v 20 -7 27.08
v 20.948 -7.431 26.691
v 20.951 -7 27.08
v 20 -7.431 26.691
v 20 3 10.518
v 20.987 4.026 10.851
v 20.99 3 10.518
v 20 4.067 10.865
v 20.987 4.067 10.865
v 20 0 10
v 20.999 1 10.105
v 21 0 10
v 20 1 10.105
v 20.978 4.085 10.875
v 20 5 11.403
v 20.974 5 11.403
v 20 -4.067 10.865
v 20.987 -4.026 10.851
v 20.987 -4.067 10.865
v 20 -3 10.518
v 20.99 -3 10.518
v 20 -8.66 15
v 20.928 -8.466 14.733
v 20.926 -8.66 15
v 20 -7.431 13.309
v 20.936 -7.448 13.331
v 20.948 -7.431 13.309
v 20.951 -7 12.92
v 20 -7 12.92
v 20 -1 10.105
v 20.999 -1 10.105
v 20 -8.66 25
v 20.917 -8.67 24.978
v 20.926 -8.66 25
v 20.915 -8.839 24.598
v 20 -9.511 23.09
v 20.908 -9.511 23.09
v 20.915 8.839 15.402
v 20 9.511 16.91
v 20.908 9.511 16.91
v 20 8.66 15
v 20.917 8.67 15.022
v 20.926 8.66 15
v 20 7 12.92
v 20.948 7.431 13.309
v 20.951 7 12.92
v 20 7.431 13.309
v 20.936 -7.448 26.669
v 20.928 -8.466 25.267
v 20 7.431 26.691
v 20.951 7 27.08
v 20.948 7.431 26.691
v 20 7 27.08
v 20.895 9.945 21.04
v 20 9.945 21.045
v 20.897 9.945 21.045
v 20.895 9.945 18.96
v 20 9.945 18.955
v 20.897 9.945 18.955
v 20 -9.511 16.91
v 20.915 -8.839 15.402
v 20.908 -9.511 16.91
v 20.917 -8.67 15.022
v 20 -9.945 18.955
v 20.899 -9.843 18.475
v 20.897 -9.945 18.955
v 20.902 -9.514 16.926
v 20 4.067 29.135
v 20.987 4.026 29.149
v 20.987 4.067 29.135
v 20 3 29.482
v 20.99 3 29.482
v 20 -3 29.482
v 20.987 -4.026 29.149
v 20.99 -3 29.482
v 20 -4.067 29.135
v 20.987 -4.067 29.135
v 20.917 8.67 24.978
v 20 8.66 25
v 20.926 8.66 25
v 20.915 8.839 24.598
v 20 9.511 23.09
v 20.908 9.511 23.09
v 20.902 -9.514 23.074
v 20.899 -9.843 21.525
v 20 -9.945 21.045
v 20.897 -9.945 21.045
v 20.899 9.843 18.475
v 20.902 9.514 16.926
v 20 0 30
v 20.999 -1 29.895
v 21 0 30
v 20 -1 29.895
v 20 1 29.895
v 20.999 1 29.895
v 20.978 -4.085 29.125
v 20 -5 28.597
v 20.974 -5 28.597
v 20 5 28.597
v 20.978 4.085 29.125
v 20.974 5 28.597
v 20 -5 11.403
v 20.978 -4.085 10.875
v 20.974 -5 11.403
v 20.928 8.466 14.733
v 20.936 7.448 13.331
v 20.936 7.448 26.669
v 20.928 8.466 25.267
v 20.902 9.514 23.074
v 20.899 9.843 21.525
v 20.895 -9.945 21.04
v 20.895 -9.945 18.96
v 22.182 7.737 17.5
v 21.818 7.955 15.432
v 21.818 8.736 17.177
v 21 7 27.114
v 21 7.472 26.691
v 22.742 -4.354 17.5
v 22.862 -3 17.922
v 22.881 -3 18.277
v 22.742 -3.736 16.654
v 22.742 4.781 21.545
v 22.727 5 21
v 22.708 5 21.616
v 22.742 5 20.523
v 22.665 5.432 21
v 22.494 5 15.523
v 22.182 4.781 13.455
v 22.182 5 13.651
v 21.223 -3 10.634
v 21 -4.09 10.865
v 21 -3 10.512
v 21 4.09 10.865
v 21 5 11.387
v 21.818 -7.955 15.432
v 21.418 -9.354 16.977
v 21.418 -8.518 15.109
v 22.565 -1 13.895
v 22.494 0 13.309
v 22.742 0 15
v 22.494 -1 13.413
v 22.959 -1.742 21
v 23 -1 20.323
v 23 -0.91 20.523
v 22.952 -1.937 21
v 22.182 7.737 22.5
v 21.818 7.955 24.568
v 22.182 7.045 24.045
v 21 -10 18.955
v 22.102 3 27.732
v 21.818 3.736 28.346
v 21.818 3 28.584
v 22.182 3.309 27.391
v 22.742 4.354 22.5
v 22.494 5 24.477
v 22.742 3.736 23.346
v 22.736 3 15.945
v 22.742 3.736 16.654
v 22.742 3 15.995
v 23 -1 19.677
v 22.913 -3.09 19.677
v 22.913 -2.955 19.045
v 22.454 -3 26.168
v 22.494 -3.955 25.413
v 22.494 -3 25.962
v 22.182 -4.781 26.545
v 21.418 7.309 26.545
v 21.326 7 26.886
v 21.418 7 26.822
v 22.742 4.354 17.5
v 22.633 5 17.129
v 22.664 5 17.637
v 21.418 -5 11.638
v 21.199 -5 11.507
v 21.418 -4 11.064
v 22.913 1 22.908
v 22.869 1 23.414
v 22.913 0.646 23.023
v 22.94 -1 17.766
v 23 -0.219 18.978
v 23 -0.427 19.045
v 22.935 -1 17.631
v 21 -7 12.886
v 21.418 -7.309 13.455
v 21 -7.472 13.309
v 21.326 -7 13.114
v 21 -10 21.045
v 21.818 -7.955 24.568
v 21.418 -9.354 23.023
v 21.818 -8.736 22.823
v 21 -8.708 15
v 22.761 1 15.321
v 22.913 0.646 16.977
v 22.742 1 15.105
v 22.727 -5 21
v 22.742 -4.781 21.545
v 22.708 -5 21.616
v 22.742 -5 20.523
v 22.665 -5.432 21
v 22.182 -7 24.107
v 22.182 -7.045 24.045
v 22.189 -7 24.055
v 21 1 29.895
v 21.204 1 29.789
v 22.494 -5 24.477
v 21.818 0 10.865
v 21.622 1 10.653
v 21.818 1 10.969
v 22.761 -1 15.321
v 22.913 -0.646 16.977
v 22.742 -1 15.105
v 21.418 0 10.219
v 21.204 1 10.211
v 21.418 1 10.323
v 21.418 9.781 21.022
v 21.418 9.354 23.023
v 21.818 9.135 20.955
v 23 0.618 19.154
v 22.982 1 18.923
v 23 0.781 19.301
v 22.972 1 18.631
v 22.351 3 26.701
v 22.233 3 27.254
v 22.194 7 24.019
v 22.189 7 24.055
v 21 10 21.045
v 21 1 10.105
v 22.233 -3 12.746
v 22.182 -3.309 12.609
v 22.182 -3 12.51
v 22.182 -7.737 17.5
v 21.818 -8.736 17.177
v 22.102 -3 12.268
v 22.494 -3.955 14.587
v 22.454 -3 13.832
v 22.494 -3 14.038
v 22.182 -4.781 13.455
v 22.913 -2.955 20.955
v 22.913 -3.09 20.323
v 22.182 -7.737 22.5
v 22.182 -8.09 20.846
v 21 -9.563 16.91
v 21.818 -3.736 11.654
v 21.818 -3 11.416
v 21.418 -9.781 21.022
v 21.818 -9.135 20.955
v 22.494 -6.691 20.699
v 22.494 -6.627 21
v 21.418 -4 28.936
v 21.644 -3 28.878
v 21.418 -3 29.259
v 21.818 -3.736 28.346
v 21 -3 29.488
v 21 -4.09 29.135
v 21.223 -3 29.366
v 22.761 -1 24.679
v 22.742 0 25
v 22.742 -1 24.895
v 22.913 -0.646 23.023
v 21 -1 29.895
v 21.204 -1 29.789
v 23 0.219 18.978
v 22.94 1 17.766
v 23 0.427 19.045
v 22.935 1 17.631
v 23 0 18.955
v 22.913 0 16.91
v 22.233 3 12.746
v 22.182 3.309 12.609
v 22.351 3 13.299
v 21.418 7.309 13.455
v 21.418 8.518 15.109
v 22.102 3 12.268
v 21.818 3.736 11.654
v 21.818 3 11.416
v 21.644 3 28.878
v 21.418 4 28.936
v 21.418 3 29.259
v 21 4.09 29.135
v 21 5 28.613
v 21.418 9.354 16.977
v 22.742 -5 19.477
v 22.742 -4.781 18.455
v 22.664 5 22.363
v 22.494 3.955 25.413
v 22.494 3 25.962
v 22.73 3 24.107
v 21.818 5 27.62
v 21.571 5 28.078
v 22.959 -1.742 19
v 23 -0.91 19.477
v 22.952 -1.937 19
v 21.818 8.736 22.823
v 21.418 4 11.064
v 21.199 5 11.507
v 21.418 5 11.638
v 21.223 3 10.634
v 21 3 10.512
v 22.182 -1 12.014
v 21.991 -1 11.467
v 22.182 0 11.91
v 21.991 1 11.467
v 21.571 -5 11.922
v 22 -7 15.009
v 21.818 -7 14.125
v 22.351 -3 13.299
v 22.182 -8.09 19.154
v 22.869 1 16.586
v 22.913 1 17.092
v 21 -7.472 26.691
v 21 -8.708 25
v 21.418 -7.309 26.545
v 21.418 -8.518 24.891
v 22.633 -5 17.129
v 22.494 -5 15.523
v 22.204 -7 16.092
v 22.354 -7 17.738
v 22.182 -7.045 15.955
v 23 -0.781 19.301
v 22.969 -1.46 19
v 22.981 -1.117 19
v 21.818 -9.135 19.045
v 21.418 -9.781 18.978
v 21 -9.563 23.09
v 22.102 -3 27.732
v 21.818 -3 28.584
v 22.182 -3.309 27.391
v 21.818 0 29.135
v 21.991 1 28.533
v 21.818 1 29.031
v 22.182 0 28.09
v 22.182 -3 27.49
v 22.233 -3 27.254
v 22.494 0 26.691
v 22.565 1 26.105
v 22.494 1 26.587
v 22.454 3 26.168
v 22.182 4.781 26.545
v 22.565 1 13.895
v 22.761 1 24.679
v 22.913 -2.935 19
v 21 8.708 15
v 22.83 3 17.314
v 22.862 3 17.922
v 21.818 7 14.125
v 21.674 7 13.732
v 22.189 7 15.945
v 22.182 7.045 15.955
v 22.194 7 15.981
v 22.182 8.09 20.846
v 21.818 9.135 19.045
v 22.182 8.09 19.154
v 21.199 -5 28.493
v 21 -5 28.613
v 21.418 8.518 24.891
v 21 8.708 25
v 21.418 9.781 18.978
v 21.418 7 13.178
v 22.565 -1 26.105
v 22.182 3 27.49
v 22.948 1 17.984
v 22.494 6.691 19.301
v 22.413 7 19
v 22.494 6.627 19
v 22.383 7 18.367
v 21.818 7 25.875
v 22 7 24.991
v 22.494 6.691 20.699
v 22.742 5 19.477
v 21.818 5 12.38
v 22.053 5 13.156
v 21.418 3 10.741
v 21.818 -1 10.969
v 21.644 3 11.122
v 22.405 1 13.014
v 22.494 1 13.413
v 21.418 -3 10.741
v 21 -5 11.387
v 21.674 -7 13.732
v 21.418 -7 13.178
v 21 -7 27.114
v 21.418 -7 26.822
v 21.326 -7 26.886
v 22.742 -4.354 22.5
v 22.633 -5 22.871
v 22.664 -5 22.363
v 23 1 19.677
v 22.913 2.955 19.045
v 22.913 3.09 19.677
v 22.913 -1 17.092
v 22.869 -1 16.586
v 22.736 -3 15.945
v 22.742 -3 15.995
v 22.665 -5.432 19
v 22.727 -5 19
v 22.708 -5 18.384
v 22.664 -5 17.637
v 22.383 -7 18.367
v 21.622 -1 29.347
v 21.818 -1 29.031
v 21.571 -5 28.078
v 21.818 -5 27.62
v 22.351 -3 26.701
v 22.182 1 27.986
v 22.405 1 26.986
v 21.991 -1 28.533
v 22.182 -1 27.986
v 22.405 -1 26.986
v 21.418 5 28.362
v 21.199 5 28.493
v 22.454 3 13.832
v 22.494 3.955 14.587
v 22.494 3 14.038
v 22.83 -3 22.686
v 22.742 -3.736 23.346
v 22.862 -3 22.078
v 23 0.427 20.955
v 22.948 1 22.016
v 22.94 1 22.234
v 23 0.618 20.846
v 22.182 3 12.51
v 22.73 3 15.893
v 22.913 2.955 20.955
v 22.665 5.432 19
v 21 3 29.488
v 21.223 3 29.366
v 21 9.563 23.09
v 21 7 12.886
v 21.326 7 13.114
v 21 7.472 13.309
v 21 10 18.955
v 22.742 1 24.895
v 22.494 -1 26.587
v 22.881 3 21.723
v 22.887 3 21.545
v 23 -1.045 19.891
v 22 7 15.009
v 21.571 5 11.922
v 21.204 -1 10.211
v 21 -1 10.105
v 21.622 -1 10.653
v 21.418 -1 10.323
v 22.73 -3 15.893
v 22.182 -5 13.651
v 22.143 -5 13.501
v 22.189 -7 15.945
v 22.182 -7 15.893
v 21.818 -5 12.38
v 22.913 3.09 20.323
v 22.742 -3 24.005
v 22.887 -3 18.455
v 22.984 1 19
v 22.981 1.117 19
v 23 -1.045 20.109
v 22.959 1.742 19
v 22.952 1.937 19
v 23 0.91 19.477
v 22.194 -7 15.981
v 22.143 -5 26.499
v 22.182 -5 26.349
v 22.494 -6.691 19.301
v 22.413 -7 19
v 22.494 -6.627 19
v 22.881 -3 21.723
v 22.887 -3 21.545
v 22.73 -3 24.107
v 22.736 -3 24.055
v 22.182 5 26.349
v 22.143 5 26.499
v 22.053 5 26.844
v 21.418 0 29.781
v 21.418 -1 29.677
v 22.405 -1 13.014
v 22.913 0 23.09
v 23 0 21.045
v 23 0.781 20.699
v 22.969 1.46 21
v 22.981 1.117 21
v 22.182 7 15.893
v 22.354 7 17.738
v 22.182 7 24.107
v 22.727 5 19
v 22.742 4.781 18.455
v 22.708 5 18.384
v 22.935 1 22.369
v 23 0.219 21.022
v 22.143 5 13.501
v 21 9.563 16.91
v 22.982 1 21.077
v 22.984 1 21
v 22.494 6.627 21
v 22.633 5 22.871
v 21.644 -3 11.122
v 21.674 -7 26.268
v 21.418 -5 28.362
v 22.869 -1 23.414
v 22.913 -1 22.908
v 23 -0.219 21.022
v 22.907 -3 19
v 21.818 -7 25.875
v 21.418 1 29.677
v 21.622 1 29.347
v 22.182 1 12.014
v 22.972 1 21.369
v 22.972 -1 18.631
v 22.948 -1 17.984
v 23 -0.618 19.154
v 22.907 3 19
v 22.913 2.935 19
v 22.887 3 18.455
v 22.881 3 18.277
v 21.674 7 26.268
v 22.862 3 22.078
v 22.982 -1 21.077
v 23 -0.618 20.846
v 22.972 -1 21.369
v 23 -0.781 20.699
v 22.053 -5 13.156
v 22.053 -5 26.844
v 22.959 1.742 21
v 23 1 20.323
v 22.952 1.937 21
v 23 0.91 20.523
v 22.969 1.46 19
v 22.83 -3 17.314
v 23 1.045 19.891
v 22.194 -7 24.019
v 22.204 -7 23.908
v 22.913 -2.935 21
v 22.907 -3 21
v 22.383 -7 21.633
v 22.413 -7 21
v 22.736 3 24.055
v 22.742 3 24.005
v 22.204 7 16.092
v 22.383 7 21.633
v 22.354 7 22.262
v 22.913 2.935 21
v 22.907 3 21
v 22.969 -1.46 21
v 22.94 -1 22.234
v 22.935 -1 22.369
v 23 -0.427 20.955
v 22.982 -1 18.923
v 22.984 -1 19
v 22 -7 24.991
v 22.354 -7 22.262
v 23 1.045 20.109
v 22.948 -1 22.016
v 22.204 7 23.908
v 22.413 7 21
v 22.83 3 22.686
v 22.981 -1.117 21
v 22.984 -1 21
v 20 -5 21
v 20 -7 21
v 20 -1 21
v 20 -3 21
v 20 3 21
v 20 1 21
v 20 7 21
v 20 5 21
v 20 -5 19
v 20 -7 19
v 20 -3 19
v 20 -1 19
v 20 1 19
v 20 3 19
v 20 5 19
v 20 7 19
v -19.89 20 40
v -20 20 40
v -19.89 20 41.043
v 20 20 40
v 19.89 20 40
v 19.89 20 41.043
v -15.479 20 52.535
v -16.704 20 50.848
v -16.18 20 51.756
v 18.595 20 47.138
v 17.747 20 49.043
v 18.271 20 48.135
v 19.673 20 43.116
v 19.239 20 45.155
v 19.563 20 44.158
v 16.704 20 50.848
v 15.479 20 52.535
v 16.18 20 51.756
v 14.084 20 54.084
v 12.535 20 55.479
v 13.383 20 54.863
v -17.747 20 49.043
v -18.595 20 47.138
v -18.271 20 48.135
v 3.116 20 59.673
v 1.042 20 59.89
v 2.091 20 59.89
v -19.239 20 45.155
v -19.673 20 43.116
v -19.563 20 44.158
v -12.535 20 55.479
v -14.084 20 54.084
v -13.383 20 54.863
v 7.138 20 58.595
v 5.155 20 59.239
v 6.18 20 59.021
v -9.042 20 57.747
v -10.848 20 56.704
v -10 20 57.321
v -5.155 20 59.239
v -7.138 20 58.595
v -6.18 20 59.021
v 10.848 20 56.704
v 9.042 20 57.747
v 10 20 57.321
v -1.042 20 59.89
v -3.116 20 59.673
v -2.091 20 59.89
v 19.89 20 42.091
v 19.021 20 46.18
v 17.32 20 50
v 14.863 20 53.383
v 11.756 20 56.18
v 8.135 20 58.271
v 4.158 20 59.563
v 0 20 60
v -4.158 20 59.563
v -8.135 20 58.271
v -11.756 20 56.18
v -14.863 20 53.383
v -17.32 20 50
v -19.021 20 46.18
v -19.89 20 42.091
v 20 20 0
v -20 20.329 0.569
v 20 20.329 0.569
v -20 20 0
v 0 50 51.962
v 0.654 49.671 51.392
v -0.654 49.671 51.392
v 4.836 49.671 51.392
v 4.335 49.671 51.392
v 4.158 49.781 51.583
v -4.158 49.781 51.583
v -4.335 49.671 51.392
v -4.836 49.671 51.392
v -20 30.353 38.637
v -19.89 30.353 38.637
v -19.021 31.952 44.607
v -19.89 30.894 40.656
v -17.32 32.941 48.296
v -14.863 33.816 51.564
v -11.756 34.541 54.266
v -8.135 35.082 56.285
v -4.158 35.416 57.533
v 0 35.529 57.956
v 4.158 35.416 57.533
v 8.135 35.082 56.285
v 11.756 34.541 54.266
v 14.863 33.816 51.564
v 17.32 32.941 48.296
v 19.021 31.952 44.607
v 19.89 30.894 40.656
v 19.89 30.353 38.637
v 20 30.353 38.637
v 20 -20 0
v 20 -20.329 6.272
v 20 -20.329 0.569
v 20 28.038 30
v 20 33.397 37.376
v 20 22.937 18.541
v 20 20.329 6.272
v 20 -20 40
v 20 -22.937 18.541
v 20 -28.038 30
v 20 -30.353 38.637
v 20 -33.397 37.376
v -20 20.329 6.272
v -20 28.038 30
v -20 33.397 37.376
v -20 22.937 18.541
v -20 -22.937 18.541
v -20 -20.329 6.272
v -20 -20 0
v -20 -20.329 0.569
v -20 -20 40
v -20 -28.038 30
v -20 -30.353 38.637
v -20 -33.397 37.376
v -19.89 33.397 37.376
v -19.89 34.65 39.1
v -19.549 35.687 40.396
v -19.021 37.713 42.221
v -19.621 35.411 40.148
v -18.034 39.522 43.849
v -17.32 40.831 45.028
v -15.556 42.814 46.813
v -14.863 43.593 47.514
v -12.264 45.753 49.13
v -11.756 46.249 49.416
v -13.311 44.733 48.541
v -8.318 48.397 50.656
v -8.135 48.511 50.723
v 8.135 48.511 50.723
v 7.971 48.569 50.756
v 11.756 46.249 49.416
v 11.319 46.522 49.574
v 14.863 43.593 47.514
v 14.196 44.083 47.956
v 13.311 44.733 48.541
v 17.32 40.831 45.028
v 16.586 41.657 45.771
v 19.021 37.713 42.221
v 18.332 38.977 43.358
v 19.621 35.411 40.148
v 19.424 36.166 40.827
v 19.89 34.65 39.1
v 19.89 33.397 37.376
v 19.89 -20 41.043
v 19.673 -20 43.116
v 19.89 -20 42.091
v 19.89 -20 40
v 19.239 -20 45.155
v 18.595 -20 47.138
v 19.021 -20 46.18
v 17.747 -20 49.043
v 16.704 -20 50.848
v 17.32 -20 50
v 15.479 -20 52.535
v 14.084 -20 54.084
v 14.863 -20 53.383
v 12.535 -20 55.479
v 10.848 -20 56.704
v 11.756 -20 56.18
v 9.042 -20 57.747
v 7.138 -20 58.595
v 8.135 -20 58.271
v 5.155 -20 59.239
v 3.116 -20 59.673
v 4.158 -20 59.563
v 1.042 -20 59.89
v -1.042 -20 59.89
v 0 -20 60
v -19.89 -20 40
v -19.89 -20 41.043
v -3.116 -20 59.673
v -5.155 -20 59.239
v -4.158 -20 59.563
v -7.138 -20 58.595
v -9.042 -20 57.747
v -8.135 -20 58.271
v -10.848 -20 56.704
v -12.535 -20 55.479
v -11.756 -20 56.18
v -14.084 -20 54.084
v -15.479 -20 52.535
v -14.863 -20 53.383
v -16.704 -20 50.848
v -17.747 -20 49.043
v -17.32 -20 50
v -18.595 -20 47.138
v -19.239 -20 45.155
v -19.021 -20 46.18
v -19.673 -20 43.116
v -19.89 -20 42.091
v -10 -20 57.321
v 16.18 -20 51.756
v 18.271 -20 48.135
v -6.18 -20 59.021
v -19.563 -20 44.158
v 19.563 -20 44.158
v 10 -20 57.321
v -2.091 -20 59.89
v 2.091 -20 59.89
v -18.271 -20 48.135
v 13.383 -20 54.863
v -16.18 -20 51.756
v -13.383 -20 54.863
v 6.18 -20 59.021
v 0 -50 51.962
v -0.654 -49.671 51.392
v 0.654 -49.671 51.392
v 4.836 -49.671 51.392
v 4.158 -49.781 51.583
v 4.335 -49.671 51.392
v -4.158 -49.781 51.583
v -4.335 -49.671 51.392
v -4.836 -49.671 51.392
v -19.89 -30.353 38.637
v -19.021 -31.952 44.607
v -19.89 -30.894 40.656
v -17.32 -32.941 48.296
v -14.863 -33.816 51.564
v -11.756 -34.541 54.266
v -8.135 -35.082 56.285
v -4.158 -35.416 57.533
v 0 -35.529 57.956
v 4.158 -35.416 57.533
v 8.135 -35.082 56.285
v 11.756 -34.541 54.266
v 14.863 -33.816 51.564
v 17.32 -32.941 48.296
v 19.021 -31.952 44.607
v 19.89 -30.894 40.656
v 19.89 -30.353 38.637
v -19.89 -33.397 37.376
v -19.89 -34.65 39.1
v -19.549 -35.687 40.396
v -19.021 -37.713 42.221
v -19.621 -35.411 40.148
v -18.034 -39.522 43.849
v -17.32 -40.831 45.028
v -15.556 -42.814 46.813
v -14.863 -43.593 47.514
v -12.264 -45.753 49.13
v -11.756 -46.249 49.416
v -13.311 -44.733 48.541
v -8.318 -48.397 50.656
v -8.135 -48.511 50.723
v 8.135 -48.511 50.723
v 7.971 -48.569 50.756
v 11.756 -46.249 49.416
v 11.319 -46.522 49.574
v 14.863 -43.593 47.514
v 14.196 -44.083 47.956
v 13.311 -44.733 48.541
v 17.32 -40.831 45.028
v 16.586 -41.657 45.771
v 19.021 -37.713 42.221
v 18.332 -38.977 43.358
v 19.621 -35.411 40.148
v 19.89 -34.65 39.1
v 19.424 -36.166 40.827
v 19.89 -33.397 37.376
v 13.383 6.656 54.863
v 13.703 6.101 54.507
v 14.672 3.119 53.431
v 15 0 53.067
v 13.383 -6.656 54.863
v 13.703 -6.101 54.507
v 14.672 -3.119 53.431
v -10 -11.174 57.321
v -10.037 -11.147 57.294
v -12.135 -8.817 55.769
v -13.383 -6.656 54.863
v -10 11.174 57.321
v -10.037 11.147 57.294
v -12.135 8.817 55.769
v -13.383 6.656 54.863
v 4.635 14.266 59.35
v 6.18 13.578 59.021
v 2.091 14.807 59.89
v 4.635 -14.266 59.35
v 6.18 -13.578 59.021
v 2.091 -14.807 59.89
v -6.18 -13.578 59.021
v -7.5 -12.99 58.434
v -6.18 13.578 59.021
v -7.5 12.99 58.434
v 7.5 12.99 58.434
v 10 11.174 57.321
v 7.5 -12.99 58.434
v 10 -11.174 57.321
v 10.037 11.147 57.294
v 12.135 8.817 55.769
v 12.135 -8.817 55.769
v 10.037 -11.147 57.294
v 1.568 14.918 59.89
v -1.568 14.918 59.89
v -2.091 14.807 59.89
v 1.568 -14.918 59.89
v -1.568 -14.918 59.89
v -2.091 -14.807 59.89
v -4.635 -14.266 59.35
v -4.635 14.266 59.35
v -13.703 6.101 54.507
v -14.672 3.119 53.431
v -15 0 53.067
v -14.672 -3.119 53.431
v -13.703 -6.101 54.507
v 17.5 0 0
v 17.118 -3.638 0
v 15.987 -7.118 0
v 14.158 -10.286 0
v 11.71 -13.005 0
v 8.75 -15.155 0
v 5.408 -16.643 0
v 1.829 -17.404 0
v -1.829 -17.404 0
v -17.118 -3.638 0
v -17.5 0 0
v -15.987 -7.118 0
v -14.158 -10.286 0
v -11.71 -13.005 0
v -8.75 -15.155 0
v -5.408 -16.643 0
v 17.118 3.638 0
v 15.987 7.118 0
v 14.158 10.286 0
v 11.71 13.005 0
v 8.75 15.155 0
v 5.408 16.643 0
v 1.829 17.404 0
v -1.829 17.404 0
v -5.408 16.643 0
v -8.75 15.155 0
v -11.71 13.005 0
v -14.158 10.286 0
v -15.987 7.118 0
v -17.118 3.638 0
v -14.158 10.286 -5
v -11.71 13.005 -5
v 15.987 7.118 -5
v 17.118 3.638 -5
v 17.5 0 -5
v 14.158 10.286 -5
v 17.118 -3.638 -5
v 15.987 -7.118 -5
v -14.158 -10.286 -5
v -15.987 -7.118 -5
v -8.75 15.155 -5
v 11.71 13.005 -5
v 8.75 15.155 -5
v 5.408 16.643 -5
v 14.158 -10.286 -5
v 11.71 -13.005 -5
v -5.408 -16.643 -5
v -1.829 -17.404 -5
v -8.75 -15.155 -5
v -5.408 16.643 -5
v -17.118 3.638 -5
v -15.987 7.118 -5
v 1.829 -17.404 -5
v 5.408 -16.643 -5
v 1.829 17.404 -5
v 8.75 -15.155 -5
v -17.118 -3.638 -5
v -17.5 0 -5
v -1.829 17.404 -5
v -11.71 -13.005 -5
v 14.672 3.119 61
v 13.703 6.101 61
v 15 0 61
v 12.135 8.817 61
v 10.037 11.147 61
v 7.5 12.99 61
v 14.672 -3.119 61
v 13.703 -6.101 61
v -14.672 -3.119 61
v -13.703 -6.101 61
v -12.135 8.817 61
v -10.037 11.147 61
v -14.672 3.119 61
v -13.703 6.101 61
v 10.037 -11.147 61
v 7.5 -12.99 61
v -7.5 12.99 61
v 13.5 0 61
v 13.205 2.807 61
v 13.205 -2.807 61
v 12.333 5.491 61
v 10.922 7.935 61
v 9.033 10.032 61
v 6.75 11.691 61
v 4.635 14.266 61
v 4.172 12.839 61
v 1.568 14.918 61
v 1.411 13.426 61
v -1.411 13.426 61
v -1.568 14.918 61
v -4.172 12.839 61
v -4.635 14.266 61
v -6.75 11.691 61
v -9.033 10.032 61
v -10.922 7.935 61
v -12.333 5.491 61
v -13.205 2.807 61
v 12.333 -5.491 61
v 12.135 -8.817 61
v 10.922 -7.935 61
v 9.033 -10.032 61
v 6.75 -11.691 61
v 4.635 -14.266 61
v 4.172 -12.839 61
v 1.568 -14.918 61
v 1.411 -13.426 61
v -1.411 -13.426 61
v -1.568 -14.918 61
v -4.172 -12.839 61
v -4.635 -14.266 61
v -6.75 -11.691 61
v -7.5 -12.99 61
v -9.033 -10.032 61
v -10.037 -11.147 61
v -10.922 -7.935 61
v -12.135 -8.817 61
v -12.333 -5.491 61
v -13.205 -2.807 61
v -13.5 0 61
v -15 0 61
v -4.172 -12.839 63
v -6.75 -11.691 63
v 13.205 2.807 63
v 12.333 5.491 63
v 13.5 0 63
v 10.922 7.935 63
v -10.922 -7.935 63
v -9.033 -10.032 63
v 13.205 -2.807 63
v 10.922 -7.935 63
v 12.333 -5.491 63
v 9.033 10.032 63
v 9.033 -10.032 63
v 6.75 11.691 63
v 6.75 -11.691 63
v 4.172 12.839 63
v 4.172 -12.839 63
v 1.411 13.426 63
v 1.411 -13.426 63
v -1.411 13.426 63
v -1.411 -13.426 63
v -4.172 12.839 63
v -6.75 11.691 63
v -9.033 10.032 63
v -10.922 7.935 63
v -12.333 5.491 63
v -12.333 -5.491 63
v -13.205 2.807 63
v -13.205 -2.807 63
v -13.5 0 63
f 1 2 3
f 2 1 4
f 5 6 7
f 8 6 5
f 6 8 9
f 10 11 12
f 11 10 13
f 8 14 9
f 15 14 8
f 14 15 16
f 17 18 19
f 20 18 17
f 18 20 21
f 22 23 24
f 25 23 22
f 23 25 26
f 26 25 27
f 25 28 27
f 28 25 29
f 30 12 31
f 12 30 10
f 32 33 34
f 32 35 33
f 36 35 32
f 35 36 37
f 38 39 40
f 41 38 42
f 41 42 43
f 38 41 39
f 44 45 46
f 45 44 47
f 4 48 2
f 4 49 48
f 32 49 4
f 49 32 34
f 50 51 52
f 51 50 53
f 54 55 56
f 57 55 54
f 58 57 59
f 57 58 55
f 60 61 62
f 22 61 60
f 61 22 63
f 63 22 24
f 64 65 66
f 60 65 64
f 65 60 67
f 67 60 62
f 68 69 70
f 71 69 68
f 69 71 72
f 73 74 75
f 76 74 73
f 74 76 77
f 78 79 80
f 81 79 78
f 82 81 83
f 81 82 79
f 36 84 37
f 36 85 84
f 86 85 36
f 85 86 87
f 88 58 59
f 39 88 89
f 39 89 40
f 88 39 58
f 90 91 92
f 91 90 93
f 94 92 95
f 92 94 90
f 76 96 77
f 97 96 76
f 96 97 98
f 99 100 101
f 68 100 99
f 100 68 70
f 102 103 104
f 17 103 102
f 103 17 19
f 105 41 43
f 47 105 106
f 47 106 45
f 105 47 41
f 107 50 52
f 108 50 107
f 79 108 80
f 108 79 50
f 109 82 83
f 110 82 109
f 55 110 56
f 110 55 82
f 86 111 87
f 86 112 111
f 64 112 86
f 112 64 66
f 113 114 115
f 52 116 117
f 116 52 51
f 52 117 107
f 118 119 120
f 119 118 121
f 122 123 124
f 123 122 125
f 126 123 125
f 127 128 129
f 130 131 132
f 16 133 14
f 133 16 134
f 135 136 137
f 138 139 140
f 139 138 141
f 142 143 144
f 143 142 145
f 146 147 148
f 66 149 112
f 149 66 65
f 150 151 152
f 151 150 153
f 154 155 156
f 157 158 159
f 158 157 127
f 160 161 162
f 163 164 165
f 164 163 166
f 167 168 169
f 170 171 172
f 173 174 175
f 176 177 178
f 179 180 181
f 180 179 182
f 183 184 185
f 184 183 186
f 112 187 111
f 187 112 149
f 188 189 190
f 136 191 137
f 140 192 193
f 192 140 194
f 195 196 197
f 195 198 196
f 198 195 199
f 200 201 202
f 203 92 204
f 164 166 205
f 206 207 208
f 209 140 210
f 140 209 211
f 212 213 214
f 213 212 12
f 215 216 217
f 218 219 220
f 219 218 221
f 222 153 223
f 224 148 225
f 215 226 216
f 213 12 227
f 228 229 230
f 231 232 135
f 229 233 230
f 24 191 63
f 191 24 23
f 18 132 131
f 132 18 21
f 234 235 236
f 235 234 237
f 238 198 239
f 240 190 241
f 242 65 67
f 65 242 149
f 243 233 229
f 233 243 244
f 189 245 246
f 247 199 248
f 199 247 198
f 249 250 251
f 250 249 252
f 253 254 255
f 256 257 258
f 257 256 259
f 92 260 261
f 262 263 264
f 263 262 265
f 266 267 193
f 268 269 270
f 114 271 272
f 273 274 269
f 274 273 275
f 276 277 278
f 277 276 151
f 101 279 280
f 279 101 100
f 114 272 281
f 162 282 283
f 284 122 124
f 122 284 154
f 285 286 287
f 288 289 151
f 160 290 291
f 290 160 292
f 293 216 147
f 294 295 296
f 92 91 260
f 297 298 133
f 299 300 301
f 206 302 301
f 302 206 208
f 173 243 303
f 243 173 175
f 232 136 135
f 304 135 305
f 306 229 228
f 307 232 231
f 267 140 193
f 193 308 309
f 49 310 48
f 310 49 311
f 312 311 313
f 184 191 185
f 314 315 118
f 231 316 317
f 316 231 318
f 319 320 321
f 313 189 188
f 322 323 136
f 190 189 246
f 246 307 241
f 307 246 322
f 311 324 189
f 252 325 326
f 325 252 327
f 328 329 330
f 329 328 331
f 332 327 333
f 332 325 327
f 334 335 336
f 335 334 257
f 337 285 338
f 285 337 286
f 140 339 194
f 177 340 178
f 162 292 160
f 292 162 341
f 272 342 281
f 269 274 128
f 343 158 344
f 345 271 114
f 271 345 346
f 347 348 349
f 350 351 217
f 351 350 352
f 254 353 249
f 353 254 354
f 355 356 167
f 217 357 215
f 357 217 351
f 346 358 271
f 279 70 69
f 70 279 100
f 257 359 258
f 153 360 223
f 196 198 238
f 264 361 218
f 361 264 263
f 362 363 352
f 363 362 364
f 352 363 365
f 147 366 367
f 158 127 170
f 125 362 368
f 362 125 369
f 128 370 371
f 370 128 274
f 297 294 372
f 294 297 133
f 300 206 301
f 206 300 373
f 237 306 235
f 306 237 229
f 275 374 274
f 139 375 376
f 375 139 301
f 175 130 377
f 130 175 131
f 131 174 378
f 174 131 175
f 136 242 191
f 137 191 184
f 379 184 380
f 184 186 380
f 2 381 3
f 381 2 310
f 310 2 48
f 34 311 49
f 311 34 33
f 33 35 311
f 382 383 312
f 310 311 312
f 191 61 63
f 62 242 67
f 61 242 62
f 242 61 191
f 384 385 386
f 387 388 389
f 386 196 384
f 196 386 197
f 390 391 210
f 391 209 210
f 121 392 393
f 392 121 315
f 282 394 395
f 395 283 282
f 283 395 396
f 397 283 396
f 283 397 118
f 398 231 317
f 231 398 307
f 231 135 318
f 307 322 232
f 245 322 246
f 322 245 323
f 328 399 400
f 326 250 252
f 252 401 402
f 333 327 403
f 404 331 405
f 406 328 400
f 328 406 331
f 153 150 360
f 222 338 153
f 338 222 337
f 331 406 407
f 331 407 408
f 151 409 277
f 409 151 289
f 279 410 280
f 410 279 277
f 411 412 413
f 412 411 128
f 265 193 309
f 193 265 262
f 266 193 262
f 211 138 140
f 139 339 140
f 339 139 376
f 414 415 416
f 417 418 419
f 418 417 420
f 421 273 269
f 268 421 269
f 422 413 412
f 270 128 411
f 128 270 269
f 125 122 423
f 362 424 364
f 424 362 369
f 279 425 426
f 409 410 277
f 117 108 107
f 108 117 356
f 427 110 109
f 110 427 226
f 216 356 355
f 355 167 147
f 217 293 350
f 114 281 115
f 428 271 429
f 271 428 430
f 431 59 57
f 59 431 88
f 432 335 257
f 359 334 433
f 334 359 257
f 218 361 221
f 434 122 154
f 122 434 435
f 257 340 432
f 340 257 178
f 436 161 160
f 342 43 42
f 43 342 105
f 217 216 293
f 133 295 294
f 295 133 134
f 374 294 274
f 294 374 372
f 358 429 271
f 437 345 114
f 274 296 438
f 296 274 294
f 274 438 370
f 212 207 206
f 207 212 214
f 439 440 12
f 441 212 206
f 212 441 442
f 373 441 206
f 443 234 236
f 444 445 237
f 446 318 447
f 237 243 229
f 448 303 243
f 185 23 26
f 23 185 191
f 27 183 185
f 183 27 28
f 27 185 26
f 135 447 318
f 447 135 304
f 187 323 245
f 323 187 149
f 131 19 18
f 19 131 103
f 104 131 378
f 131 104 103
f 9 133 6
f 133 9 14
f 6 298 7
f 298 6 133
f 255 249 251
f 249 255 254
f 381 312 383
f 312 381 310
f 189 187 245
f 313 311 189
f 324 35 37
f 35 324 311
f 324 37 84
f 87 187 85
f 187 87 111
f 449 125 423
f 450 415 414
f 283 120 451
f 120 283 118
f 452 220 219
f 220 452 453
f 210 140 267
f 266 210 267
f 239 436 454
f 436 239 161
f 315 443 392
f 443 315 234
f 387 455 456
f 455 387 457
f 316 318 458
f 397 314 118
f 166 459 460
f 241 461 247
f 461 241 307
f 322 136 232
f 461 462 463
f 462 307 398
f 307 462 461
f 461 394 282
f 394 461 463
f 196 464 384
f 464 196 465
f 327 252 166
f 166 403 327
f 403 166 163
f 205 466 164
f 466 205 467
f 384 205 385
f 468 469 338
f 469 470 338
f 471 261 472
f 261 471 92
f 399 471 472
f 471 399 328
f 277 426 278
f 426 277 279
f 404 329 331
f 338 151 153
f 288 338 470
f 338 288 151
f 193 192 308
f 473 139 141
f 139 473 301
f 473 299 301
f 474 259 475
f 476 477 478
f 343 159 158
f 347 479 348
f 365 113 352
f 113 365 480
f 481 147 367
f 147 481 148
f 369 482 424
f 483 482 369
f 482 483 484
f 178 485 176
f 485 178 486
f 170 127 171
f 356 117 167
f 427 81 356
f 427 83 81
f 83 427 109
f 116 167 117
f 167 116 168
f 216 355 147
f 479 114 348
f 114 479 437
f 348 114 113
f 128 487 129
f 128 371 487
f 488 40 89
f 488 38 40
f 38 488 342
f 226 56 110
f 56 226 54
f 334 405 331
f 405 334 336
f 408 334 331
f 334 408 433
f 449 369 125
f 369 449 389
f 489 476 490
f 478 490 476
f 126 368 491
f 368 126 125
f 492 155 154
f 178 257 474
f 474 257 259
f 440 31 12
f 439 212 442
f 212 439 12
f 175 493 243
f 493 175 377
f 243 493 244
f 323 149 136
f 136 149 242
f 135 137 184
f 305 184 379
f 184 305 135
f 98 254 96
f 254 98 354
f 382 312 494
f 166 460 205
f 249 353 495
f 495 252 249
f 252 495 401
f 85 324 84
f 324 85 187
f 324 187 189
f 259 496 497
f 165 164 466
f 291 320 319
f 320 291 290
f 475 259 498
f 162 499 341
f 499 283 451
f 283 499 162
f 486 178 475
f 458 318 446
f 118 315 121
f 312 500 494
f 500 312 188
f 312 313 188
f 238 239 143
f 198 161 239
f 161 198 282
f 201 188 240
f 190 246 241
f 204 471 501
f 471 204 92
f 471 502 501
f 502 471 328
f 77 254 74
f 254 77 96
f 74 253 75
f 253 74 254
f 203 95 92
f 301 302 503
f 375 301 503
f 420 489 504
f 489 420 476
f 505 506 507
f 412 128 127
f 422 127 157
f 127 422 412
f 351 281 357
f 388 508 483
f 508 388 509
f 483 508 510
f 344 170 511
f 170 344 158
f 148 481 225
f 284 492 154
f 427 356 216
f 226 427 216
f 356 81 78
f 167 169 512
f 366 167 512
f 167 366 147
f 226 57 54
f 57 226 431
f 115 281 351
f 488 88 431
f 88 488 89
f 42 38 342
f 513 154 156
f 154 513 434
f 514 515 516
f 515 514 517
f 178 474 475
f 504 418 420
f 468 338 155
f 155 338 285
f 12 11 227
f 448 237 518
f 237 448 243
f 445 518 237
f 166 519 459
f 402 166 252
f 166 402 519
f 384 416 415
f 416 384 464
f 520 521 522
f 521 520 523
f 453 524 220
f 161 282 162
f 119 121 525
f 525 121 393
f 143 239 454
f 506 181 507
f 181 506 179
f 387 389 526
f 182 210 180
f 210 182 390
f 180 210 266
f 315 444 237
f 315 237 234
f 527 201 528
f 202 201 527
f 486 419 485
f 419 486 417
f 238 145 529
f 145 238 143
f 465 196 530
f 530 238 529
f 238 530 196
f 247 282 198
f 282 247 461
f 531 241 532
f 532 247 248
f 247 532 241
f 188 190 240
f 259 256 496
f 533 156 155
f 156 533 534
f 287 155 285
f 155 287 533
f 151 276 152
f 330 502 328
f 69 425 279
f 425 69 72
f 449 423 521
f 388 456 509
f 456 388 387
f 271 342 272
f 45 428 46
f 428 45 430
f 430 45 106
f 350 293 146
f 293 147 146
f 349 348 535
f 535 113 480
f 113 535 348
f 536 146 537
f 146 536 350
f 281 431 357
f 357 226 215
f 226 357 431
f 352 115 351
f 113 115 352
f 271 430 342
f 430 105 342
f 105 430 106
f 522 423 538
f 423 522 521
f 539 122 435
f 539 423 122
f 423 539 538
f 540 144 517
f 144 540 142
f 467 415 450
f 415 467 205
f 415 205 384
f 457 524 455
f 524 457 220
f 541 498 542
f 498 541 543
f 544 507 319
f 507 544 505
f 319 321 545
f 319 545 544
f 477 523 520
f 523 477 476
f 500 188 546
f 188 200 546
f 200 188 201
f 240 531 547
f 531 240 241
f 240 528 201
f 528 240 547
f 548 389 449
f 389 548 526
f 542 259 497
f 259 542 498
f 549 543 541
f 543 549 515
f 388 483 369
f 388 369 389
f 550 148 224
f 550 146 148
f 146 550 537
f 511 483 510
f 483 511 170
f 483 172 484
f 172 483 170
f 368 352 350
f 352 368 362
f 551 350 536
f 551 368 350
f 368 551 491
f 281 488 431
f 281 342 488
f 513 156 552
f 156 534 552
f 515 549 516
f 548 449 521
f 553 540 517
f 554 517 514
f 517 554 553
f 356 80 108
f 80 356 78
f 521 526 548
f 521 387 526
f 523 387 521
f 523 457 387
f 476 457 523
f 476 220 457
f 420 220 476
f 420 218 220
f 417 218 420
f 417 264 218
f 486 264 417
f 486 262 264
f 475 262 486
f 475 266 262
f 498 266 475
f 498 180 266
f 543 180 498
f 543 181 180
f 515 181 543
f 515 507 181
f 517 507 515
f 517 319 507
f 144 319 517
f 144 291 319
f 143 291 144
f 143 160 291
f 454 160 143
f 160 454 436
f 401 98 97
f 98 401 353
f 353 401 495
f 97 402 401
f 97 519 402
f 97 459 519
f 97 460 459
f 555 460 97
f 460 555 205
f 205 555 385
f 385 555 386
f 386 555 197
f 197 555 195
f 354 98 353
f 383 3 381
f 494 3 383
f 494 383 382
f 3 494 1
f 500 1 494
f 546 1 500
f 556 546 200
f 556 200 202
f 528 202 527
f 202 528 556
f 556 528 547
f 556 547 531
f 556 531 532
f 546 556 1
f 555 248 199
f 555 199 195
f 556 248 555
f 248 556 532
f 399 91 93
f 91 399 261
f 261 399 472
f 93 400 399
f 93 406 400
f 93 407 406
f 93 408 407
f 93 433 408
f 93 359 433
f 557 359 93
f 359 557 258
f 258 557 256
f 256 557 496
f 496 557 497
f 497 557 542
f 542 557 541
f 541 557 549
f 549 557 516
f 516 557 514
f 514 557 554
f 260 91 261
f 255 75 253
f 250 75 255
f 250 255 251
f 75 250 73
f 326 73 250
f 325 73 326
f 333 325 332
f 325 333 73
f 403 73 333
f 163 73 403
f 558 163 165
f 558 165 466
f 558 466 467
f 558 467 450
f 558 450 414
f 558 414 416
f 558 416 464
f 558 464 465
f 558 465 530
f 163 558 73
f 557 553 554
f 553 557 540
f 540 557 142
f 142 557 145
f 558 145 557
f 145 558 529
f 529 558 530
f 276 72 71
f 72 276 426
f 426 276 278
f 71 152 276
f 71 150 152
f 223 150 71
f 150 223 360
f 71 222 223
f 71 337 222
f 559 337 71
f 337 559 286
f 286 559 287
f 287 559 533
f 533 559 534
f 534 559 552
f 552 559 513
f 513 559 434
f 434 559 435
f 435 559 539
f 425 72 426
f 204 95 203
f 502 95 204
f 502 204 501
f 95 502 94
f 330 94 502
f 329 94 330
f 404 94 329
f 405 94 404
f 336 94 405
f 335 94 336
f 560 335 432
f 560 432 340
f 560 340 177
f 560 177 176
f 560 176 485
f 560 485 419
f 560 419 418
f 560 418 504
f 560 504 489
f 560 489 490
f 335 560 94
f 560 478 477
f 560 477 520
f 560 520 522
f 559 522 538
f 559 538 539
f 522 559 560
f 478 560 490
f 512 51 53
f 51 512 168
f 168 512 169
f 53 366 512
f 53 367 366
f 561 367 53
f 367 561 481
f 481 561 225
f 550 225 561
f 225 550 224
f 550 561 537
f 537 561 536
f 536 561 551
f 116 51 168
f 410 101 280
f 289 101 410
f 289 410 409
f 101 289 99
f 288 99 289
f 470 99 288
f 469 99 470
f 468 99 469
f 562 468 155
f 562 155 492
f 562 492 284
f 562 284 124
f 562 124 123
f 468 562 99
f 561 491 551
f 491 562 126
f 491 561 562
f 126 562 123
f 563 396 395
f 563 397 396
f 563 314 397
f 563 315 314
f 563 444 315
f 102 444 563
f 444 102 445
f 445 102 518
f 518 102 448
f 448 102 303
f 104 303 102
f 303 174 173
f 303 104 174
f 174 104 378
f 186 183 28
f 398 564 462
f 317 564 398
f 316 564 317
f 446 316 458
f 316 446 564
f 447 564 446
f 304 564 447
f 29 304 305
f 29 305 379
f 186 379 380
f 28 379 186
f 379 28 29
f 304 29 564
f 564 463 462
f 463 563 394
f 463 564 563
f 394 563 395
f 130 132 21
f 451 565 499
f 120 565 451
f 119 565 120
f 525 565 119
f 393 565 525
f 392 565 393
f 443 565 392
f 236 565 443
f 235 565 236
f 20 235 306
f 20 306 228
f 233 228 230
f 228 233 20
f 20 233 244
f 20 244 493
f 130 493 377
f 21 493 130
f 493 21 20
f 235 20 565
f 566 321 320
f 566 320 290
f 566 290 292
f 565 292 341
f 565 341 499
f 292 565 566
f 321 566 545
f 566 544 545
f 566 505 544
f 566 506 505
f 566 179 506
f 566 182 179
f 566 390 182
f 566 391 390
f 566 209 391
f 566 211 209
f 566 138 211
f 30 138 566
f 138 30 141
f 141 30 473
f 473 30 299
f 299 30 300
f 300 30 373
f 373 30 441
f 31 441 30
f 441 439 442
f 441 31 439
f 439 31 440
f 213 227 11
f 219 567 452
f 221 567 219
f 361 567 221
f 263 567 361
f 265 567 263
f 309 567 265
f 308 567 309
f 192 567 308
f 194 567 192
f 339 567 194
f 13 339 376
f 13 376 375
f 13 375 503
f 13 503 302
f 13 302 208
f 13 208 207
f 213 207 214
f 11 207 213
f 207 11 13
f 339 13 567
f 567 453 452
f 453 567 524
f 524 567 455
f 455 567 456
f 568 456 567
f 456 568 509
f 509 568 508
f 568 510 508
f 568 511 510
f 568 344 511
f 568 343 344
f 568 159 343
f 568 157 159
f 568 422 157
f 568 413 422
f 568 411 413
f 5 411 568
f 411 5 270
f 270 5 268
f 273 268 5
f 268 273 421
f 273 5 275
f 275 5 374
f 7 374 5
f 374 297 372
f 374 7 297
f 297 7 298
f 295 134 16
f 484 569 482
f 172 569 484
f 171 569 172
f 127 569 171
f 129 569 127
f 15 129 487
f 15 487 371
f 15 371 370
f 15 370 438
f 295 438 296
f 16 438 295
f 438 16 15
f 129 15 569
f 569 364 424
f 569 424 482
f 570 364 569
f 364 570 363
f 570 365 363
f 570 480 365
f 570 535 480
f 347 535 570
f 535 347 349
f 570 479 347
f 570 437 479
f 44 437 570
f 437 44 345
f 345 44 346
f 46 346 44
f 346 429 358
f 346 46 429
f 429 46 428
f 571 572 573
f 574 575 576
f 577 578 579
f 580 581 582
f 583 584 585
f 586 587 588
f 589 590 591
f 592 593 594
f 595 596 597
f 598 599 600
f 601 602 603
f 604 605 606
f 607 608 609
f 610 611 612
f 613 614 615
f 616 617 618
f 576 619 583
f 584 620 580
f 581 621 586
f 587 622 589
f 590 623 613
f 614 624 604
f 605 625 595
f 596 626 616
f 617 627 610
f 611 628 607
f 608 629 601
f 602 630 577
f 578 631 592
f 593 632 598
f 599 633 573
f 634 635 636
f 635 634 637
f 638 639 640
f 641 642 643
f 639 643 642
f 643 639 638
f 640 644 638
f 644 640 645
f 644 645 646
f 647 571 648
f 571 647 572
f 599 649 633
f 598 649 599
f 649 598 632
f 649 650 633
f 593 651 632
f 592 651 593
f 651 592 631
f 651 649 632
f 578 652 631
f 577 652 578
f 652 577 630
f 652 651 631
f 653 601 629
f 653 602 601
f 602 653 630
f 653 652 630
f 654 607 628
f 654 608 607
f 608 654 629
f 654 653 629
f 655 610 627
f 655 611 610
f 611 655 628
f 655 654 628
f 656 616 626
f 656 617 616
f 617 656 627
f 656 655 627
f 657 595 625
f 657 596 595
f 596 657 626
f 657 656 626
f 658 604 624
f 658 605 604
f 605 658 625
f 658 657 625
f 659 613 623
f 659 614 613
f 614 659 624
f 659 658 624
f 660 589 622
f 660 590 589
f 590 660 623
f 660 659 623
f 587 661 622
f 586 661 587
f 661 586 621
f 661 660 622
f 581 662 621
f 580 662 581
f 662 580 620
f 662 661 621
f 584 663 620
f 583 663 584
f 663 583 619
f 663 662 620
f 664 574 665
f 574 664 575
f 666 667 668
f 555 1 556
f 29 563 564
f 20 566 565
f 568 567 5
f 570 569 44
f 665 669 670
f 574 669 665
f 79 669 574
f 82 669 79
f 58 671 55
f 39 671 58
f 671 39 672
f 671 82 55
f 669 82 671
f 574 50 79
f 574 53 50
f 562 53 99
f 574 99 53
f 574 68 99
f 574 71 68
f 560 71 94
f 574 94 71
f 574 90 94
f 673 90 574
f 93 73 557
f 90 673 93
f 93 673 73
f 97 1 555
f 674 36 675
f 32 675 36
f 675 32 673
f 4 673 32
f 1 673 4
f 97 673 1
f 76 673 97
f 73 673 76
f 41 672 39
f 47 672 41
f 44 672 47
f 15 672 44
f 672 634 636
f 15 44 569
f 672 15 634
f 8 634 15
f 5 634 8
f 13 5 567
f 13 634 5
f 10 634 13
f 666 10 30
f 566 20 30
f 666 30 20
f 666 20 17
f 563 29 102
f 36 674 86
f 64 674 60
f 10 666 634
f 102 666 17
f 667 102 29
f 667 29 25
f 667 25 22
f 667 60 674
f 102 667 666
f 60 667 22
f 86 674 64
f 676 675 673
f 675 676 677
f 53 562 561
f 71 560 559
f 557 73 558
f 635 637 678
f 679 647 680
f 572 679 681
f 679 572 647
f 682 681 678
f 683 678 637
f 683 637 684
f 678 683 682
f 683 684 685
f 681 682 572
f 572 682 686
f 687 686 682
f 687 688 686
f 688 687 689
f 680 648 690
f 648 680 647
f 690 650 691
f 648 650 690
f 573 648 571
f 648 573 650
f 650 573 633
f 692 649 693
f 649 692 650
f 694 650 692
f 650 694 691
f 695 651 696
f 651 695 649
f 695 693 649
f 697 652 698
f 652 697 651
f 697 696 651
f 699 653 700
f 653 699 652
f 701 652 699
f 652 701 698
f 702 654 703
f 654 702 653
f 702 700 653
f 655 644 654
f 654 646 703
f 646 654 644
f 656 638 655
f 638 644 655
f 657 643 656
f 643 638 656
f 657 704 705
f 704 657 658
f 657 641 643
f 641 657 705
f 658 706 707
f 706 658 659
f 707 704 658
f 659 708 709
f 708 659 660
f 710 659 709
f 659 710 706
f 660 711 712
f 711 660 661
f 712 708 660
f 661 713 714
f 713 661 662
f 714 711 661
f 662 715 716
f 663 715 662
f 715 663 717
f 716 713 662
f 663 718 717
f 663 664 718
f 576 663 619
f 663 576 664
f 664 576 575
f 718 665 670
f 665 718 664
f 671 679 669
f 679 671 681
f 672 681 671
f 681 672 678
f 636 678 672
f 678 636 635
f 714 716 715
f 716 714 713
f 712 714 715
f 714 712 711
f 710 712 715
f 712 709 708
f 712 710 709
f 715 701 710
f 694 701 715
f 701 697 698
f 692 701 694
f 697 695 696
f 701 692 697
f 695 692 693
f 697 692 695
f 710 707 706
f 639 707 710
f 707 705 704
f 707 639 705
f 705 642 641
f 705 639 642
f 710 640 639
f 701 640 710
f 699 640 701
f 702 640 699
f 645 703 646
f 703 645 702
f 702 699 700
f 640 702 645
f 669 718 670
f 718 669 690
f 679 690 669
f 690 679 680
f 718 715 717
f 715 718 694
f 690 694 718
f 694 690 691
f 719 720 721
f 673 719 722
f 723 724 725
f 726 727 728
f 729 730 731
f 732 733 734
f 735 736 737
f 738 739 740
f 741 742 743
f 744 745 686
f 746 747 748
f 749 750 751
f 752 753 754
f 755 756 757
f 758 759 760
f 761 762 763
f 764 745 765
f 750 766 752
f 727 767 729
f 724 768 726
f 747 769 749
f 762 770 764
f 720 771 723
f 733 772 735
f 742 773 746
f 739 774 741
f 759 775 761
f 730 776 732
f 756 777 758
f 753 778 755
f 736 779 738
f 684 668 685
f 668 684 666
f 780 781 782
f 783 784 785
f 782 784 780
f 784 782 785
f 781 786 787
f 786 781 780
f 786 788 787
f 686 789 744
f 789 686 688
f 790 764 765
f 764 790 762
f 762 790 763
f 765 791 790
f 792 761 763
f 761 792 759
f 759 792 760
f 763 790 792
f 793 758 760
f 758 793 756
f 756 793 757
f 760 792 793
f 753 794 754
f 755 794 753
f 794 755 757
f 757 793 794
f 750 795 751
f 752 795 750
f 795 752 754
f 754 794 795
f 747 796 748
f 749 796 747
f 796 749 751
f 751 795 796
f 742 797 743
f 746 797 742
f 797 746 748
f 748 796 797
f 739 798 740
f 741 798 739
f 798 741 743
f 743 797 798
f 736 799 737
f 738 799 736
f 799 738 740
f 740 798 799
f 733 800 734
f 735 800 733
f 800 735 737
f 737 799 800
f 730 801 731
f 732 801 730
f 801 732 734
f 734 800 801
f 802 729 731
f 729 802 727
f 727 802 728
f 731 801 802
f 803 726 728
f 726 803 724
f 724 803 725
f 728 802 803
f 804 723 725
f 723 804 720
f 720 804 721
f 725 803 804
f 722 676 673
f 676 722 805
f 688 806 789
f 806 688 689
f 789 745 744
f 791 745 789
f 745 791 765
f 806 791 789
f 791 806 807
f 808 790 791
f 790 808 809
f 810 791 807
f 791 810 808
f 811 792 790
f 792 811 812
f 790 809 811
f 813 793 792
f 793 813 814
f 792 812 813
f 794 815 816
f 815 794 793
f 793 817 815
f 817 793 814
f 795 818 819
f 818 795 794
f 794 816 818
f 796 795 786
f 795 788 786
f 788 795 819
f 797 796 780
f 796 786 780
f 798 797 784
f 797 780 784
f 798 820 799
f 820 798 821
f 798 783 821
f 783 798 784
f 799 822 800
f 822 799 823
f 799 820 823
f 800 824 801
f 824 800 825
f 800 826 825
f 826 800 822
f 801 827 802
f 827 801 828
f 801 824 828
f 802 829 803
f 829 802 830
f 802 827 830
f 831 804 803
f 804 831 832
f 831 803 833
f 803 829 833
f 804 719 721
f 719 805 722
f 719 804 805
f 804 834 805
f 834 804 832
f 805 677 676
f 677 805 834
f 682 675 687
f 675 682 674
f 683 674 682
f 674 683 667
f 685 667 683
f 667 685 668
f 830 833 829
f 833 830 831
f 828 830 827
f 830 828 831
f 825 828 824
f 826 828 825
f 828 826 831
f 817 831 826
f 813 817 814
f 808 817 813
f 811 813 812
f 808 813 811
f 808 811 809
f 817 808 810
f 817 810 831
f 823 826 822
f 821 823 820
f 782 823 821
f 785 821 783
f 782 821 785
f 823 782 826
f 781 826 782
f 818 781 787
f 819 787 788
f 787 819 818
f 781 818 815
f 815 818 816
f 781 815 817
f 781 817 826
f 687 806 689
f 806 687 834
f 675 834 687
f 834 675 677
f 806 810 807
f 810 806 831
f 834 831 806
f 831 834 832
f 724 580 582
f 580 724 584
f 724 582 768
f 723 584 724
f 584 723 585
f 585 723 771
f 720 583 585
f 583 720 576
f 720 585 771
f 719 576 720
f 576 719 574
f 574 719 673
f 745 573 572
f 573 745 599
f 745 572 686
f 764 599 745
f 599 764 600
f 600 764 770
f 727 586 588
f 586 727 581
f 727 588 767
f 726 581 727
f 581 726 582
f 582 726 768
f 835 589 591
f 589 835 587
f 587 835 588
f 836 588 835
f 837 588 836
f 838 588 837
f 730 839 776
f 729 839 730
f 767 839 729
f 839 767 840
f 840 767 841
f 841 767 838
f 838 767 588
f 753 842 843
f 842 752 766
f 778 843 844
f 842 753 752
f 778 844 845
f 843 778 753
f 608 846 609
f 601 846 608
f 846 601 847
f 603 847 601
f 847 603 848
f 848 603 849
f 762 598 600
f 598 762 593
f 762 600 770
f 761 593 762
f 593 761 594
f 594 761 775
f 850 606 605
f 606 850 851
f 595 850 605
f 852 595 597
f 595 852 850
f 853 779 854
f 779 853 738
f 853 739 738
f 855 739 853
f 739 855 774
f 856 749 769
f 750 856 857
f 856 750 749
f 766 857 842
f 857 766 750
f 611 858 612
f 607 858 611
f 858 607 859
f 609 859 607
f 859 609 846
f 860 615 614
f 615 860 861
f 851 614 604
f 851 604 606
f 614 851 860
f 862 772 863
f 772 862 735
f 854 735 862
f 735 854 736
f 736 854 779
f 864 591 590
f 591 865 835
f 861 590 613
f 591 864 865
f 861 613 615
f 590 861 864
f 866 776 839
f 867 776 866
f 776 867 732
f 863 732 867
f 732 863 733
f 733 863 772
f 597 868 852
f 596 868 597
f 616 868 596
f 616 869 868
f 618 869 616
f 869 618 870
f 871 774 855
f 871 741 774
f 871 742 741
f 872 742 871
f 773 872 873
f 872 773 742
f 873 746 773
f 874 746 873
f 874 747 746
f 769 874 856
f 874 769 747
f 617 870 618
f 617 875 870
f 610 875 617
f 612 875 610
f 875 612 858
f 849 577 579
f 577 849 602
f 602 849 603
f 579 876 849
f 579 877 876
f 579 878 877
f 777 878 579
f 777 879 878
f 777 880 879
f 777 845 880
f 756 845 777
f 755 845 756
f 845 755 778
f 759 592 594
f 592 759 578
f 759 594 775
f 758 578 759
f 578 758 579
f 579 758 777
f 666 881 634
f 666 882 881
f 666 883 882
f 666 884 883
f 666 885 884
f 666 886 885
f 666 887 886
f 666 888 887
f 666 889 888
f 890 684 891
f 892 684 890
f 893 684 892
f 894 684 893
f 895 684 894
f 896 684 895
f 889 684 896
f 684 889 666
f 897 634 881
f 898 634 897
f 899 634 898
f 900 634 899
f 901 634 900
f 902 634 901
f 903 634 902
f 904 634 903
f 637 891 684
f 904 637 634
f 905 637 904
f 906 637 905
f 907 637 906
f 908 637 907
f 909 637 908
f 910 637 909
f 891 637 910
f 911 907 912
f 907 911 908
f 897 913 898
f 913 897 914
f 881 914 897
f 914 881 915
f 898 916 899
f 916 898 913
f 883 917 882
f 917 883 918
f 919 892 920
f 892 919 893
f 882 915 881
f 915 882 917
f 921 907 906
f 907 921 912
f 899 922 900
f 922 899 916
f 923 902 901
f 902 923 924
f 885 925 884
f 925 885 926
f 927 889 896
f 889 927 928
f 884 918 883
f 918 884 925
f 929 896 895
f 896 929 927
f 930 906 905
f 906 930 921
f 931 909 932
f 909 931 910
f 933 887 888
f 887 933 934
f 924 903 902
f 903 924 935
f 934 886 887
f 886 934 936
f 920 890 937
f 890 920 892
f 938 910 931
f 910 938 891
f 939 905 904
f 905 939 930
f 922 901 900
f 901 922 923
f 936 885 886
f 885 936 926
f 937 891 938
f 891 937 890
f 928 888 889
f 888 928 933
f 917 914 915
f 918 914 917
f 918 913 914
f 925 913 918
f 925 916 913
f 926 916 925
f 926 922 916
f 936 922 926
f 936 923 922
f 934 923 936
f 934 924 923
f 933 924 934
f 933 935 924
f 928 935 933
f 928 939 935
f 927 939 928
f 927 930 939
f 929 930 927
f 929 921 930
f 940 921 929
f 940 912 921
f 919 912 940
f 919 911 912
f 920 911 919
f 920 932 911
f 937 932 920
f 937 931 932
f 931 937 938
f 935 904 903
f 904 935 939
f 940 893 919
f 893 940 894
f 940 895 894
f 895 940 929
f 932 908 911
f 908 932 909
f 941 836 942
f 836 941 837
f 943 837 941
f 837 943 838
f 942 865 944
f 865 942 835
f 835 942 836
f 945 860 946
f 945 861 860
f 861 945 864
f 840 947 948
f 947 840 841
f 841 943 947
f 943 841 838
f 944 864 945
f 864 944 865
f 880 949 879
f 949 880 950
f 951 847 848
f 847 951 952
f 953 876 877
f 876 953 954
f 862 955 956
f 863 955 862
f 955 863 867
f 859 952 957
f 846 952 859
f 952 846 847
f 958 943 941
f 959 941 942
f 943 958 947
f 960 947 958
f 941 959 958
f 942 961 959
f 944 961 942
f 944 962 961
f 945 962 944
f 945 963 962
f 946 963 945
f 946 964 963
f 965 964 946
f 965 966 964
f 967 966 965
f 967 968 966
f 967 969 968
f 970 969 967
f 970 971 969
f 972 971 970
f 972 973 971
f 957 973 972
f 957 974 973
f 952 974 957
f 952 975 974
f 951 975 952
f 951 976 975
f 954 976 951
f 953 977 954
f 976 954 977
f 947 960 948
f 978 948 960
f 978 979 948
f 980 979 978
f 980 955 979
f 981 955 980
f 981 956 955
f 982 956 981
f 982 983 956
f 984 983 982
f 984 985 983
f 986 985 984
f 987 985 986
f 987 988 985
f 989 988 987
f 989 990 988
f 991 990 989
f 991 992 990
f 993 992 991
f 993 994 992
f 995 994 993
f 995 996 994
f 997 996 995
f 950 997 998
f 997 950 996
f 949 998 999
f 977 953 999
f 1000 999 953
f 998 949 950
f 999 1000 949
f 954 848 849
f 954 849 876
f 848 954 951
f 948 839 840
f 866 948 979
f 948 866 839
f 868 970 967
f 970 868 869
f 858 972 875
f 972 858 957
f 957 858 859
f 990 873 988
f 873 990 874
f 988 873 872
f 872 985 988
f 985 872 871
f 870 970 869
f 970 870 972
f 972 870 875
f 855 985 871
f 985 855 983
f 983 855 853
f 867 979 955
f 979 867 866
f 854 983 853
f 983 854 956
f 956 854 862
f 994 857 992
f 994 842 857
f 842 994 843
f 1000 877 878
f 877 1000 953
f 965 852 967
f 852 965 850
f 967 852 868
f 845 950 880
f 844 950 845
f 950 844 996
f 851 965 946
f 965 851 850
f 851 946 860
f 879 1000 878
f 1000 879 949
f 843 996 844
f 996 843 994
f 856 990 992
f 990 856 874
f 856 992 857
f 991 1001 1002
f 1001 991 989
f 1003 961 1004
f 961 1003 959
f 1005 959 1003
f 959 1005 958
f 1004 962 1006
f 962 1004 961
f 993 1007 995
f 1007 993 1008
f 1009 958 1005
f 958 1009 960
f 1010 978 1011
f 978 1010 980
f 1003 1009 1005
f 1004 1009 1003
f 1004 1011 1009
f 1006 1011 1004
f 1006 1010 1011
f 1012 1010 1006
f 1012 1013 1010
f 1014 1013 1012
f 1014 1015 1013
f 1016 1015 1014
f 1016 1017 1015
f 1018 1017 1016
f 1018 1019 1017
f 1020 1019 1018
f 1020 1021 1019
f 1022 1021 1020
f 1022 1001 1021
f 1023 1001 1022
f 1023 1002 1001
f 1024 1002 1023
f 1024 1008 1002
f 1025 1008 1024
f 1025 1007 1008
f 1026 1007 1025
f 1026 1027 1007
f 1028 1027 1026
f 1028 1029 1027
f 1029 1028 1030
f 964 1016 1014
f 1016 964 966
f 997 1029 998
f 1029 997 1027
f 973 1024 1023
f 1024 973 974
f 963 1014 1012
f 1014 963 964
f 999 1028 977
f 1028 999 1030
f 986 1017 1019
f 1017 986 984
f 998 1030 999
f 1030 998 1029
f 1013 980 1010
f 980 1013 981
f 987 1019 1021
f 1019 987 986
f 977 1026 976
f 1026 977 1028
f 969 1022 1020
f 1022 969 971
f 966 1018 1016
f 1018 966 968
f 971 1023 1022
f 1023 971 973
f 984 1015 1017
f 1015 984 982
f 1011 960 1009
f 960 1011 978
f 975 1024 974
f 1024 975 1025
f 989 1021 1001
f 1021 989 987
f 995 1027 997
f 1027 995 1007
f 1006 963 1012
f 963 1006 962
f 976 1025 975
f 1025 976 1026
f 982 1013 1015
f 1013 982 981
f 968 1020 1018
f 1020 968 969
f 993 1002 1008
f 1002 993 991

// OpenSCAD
translate([21, 0, 20])

color("green")
Speaker();

Torso();


// waist
translate([0, 0, -2.5])
cylinder(h=5, d=35, center=true);

//neck
translate([0, 0, 56])
cylinder(h=10, d=30, center=true);
translate([0, 0, 58])
cylinder(h=10, d=27, center=true);




//Torso();
module Torso()
{
	translate([0, 0, 40])
	rotate([90, 0, 0])
	cylinder(h=40, r=20, center=true);
    
	translate([0, 0, 20])
	cube([40, 40, 40], center=true);
	
	LeftShoulder();
	RightShoulder();
}

module RightShoulder()
{
	mirror([0, -1, 0])
		LeftShoulder();
	
}

module LeftShoulder()
{
	translate([0, 20, 0])
	rotate([0, -90, 0])
	{
		difference()
		{
			rotate_extrude(angle = 30)
			{
				union()
				{
					translate([40, 0, 0])
						circle(20, center=true);
					translate([20, 0, 0])
						square(40, center=true);
				}
			}

			translate([0, 60, -25])
				color("green")
					cylinder(r=60, h=50);
		}
	}
}

module Speaker()
{
	rotate([0, 90, 0])
	
	difference(){

		union()
		{
			translate([0, 0, -2])
				cylinder(h=4, r=10, center=true);
			resize([20, 20, 4])
				sphere(r=10, center=true);
		}
		for (x=[-11 : 22 : 11])
		{
			for (y=[-6 : 4 : 6])
			{
				translate([x, y, 0])
				rotate([0, 0, 90])
				cube([2, 20, 20], center=true);
			}
		}
	}
}
